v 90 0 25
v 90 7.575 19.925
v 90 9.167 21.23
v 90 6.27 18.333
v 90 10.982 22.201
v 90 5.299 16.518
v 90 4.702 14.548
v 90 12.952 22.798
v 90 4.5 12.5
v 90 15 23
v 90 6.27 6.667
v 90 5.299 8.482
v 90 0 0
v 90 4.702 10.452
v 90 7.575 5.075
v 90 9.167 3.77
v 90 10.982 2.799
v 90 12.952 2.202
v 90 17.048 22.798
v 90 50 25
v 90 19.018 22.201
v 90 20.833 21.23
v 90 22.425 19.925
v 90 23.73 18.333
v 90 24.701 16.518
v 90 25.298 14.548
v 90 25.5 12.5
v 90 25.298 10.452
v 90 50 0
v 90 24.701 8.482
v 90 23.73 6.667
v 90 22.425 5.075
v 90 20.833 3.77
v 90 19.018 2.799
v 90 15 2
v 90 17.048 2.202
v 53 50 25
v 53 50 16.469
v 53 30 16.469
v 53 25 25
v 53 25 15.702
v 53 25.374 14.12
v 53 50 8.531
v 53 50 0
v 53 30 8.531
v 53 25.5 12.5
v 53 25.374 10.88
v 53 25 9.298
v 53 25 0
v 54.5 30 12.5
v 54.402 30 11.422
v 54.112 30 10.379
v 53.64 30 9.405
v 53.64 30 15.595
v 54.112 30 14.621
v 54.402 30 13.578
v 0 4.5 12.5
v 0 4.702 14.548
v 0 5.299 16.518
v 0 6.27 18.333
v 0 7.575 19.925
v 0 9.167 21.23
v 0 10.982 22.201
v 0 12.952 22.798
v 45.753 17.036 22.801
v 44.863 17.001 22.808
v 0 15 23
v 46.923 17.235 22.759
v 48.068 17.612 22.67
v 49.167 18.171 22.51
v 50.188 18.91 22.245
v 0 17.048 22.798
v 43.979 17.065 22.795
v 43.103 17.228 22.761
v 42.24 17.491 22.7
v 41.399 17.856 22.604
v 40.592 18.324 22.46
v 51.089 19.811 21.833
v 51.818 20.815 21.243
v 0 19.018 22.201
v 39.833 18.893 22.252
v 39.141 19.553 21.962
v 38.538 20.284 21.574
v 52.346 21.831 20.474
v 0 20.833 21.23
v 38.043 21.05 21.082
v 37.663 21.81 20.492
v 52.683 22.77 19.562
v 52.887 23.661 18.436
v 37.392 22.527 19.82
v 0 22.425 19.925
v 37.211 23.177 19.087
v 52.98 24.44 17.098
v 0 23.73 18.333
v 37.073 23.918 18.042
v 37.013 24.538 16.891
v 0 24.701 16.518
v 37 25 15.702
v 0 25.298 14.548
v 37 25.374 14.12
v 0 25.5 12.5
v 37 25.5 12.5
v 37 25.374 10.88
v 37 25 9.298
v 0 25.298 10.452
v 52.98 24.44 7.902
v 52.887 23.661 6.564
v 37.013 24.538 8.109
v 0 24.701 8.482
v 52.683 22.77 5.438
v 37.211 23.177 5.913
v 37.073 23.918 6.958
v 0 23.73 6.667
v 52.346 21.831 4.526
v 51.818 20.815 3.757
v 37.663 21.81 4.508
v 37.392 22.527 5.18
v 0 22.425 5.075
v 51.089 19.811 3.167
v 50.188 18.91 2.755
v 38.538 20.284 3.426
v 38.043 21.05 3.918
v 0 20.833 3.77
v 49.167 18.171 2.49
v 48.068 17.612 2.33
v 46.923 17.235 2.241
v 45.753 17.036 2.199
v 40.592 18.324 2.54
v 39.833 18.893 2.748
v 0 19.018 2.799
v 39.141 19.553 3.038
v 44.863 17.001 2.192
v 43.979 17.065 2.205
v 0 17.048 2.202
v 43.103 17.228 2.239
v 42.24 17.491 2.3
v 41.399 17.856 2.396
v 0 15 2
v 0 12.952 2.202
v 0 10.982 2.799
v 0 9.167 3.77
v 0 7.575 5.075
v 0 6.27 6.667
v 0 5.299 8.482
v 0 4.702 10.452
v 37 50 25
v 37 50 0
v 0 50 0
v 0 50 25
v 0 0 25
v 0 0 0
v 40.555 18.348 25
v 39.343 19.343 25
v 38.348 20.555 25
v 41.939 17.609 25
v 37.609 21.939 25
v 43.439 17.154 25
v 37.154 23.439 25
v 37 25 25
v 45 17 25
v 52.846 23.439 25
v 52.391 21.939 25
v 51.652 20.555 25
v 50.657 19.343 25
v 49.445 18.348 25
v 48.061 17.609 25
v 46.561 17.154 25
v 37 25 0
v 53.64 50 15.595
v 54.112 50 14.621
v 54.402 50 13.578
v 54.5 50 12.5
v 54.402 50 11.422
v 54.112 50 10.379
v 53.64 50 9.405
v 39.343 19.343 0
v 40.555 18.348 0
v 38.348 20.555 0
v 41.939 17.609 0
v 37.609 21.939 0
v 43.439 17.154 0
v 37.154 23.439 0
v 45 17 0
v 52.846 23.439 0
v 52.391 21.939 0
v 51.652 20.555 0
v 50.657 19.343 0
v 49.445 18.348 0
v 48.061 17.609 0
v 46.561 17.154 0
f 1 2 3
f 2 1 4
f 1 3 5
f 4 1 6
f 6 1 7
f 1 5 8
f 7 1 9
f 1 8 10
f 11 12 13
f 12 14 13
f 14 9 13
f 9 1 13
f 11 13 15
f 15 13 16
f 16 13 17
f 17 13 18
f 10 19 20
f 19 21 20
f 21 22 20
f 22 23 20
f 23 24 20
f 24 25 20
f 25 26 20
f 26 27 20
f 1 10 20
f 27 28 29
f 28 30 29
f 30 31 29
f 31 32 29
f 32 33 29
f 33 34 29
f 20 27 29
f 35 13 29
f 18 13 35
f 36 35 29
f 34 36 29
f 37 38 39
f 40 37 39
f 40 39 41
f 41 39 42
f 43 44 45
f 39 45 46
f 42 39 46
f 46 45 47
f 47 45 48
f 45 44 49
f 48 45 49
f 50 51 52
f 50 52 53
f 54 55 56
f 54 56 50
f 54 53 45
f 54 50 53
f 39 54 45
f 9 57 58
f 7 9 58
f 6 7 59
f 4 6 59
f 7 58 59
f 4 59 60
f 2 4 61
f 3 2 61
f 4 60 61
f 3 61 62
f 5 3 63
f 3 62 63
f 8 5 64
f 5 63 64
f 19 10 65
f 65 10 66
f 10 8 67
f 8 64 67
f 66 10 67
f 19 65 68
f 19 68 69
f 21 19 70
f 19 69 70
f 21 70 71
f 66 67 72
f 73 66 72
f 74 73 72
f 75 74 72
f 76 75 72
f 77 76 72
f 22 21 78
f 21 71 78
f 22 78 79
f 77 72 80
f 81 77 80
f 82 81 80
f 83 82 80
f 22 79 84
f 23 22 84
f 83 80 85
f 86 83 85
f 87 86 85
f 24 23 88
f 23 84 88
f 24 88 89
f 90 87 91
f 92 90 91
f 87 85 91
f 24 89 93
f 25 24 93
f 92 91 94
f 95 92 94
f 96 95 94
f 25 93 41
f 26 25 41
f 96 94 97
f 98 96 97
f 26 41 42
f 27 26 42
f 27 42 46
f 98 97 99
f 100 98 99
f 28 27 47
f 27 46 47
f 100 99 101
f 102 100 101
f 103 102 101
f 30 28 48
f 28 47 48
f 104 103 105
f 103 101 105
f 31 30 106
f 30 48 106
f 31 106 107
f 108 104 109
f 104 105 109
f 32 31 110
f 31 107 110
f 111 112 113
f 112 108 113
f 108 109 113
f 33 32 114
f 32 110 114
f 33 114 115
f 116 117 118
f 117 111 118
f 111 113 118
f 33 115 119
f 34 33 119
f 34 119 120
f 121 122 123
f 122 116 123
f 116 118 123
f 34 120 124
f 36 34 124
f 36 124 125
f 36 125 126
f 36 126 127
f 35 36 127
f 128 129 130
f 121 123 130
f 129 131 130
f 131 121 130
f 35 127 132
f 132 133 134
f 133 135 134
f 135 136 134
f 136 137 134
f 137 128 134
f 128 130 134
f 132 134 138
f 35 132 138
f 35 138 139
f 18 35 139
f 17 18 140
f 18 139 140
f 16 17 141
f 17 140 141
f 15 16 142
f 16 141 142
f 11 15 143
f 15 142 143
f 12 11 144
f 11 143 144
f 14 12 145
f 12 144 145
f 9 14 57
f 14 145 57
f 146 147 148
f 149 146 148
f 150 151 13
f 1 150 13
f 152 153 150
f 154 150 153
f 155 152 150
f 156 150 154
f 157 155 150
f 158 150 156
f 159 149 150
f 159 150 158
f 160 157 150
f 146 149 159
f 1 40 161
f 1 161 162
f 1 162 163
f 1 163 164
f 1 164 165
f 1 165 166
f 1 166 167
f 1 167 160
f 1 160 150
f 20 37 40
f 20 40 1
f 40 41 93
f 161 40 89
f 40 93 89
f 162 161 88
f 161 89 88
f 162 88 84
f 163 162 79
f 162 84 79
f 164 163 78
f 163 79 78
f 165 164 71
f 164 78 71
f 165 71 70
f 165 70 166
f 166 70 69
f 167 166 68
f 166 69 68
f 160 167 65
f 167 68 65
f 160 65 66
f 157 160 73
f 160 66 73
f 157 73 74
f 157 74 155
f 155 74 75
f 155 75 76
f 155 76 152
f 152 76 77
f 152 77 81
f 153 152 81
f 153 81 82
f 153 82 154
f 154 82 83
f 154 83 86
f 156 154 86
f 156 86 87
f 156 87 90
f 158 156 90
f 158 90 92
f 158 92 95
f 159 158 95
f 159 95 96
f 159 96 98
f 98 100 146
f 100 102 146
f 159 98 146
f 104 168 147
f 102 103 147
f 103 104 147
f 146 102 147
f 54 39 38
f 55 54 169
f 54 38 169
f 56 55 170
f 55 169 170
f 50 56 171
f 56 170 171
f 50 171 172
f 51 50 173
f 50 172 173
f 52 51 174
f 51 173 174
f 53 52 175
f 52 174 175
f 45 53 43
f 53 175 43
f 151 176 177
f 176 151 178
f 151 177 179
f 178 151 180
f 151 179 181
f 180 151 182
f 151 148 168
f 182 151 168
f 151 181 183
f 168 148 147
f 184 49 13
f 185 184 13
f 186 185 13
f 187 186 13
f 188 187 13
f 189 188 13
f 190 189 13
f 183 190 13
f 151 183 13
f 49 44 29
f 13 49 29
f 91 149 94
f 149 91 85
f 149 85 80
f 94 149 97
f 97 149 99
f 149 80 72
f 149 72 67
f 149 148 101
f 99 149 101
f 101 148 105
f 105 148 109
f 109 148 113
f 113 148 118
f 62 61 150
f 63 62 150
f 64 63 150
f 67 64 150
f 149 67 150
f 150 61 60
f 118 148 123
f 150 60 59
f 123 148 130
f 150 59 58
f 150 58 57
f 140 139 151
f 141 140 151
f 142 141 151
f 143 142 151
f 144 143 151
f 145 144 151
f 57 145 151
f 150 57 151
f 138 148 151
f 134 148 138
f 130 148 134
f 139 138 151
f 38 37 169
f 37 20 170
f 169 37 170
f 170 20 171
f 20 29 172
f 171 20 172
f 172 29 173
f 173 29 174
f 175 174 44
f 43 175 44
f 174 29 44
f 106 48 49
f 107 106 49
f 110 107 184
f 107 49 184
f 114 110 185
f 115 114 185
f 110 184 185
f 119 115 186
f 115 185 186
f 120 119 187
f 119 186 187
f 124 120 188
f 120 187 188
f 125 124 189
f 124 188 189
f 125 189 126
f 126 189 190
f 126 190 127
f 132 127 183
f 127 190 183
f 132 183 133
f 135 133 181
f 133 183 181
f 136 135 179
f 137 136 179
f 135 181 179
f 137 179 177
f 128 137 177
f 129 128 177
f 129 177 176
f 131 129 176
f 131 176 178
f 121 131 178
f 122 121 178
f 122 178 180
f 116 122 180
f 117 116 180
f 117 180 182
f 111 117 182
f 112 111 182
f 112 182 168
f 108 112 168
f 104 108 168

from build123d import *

# Parameters (mm, degrees)
F1_DEPTH = 25
F2_R     = 10.5
F3_DEPTH = 90.001
F4_R     = 6
F5_DEPTH = 20


with BuildPart() as f1:
    # F0 (on Top) → F1 (new body)
    with BuildSketch(Plane.XY):
        with BuildLine():
            Line((0, 50), (0, 0))
            Line((0, 0), (90, 0))
            Line((90, 0), (90, 50))
            Line((90, 50), (53, 50))
            Line((53, 50), (53, 25))
            ThreePointArc((53, 25), (45, 17), (37, 25))
            Line((37, 25), (37, 50))
            Line((37, 50), (0, 50))
        make_face()
    extrude(amount=F1_DEPTH)

    # F2 (on face) → F3 (cut, through all)
    with BuildSketch(Plane(origin=(0, 0, 0), x_dir=(0, -1, 0), z_dir=(-1, 0, 0))):
        with Locations((-15, 12.5)):
            Circle(F2_R)
    extrude(amount=-F3_DEPTH, mode=Mode.SUBTRACT)

    # F4 (on face) → F5 (cut)
    with BuildSketch(Plane(origin=(0, 50, 0), x_dir=(-1, 0, 0), z_dir=(0, 1, 0))):
        with Locations((-48.5, 12.5)):
            Circle(F4_R)
        with Locations((11.5, 12.5)):
            Circle(F4_R)
    extrude(amount=-F5_DEPTH, mode=Mode.SUBTRACT)


solid = f1.part
